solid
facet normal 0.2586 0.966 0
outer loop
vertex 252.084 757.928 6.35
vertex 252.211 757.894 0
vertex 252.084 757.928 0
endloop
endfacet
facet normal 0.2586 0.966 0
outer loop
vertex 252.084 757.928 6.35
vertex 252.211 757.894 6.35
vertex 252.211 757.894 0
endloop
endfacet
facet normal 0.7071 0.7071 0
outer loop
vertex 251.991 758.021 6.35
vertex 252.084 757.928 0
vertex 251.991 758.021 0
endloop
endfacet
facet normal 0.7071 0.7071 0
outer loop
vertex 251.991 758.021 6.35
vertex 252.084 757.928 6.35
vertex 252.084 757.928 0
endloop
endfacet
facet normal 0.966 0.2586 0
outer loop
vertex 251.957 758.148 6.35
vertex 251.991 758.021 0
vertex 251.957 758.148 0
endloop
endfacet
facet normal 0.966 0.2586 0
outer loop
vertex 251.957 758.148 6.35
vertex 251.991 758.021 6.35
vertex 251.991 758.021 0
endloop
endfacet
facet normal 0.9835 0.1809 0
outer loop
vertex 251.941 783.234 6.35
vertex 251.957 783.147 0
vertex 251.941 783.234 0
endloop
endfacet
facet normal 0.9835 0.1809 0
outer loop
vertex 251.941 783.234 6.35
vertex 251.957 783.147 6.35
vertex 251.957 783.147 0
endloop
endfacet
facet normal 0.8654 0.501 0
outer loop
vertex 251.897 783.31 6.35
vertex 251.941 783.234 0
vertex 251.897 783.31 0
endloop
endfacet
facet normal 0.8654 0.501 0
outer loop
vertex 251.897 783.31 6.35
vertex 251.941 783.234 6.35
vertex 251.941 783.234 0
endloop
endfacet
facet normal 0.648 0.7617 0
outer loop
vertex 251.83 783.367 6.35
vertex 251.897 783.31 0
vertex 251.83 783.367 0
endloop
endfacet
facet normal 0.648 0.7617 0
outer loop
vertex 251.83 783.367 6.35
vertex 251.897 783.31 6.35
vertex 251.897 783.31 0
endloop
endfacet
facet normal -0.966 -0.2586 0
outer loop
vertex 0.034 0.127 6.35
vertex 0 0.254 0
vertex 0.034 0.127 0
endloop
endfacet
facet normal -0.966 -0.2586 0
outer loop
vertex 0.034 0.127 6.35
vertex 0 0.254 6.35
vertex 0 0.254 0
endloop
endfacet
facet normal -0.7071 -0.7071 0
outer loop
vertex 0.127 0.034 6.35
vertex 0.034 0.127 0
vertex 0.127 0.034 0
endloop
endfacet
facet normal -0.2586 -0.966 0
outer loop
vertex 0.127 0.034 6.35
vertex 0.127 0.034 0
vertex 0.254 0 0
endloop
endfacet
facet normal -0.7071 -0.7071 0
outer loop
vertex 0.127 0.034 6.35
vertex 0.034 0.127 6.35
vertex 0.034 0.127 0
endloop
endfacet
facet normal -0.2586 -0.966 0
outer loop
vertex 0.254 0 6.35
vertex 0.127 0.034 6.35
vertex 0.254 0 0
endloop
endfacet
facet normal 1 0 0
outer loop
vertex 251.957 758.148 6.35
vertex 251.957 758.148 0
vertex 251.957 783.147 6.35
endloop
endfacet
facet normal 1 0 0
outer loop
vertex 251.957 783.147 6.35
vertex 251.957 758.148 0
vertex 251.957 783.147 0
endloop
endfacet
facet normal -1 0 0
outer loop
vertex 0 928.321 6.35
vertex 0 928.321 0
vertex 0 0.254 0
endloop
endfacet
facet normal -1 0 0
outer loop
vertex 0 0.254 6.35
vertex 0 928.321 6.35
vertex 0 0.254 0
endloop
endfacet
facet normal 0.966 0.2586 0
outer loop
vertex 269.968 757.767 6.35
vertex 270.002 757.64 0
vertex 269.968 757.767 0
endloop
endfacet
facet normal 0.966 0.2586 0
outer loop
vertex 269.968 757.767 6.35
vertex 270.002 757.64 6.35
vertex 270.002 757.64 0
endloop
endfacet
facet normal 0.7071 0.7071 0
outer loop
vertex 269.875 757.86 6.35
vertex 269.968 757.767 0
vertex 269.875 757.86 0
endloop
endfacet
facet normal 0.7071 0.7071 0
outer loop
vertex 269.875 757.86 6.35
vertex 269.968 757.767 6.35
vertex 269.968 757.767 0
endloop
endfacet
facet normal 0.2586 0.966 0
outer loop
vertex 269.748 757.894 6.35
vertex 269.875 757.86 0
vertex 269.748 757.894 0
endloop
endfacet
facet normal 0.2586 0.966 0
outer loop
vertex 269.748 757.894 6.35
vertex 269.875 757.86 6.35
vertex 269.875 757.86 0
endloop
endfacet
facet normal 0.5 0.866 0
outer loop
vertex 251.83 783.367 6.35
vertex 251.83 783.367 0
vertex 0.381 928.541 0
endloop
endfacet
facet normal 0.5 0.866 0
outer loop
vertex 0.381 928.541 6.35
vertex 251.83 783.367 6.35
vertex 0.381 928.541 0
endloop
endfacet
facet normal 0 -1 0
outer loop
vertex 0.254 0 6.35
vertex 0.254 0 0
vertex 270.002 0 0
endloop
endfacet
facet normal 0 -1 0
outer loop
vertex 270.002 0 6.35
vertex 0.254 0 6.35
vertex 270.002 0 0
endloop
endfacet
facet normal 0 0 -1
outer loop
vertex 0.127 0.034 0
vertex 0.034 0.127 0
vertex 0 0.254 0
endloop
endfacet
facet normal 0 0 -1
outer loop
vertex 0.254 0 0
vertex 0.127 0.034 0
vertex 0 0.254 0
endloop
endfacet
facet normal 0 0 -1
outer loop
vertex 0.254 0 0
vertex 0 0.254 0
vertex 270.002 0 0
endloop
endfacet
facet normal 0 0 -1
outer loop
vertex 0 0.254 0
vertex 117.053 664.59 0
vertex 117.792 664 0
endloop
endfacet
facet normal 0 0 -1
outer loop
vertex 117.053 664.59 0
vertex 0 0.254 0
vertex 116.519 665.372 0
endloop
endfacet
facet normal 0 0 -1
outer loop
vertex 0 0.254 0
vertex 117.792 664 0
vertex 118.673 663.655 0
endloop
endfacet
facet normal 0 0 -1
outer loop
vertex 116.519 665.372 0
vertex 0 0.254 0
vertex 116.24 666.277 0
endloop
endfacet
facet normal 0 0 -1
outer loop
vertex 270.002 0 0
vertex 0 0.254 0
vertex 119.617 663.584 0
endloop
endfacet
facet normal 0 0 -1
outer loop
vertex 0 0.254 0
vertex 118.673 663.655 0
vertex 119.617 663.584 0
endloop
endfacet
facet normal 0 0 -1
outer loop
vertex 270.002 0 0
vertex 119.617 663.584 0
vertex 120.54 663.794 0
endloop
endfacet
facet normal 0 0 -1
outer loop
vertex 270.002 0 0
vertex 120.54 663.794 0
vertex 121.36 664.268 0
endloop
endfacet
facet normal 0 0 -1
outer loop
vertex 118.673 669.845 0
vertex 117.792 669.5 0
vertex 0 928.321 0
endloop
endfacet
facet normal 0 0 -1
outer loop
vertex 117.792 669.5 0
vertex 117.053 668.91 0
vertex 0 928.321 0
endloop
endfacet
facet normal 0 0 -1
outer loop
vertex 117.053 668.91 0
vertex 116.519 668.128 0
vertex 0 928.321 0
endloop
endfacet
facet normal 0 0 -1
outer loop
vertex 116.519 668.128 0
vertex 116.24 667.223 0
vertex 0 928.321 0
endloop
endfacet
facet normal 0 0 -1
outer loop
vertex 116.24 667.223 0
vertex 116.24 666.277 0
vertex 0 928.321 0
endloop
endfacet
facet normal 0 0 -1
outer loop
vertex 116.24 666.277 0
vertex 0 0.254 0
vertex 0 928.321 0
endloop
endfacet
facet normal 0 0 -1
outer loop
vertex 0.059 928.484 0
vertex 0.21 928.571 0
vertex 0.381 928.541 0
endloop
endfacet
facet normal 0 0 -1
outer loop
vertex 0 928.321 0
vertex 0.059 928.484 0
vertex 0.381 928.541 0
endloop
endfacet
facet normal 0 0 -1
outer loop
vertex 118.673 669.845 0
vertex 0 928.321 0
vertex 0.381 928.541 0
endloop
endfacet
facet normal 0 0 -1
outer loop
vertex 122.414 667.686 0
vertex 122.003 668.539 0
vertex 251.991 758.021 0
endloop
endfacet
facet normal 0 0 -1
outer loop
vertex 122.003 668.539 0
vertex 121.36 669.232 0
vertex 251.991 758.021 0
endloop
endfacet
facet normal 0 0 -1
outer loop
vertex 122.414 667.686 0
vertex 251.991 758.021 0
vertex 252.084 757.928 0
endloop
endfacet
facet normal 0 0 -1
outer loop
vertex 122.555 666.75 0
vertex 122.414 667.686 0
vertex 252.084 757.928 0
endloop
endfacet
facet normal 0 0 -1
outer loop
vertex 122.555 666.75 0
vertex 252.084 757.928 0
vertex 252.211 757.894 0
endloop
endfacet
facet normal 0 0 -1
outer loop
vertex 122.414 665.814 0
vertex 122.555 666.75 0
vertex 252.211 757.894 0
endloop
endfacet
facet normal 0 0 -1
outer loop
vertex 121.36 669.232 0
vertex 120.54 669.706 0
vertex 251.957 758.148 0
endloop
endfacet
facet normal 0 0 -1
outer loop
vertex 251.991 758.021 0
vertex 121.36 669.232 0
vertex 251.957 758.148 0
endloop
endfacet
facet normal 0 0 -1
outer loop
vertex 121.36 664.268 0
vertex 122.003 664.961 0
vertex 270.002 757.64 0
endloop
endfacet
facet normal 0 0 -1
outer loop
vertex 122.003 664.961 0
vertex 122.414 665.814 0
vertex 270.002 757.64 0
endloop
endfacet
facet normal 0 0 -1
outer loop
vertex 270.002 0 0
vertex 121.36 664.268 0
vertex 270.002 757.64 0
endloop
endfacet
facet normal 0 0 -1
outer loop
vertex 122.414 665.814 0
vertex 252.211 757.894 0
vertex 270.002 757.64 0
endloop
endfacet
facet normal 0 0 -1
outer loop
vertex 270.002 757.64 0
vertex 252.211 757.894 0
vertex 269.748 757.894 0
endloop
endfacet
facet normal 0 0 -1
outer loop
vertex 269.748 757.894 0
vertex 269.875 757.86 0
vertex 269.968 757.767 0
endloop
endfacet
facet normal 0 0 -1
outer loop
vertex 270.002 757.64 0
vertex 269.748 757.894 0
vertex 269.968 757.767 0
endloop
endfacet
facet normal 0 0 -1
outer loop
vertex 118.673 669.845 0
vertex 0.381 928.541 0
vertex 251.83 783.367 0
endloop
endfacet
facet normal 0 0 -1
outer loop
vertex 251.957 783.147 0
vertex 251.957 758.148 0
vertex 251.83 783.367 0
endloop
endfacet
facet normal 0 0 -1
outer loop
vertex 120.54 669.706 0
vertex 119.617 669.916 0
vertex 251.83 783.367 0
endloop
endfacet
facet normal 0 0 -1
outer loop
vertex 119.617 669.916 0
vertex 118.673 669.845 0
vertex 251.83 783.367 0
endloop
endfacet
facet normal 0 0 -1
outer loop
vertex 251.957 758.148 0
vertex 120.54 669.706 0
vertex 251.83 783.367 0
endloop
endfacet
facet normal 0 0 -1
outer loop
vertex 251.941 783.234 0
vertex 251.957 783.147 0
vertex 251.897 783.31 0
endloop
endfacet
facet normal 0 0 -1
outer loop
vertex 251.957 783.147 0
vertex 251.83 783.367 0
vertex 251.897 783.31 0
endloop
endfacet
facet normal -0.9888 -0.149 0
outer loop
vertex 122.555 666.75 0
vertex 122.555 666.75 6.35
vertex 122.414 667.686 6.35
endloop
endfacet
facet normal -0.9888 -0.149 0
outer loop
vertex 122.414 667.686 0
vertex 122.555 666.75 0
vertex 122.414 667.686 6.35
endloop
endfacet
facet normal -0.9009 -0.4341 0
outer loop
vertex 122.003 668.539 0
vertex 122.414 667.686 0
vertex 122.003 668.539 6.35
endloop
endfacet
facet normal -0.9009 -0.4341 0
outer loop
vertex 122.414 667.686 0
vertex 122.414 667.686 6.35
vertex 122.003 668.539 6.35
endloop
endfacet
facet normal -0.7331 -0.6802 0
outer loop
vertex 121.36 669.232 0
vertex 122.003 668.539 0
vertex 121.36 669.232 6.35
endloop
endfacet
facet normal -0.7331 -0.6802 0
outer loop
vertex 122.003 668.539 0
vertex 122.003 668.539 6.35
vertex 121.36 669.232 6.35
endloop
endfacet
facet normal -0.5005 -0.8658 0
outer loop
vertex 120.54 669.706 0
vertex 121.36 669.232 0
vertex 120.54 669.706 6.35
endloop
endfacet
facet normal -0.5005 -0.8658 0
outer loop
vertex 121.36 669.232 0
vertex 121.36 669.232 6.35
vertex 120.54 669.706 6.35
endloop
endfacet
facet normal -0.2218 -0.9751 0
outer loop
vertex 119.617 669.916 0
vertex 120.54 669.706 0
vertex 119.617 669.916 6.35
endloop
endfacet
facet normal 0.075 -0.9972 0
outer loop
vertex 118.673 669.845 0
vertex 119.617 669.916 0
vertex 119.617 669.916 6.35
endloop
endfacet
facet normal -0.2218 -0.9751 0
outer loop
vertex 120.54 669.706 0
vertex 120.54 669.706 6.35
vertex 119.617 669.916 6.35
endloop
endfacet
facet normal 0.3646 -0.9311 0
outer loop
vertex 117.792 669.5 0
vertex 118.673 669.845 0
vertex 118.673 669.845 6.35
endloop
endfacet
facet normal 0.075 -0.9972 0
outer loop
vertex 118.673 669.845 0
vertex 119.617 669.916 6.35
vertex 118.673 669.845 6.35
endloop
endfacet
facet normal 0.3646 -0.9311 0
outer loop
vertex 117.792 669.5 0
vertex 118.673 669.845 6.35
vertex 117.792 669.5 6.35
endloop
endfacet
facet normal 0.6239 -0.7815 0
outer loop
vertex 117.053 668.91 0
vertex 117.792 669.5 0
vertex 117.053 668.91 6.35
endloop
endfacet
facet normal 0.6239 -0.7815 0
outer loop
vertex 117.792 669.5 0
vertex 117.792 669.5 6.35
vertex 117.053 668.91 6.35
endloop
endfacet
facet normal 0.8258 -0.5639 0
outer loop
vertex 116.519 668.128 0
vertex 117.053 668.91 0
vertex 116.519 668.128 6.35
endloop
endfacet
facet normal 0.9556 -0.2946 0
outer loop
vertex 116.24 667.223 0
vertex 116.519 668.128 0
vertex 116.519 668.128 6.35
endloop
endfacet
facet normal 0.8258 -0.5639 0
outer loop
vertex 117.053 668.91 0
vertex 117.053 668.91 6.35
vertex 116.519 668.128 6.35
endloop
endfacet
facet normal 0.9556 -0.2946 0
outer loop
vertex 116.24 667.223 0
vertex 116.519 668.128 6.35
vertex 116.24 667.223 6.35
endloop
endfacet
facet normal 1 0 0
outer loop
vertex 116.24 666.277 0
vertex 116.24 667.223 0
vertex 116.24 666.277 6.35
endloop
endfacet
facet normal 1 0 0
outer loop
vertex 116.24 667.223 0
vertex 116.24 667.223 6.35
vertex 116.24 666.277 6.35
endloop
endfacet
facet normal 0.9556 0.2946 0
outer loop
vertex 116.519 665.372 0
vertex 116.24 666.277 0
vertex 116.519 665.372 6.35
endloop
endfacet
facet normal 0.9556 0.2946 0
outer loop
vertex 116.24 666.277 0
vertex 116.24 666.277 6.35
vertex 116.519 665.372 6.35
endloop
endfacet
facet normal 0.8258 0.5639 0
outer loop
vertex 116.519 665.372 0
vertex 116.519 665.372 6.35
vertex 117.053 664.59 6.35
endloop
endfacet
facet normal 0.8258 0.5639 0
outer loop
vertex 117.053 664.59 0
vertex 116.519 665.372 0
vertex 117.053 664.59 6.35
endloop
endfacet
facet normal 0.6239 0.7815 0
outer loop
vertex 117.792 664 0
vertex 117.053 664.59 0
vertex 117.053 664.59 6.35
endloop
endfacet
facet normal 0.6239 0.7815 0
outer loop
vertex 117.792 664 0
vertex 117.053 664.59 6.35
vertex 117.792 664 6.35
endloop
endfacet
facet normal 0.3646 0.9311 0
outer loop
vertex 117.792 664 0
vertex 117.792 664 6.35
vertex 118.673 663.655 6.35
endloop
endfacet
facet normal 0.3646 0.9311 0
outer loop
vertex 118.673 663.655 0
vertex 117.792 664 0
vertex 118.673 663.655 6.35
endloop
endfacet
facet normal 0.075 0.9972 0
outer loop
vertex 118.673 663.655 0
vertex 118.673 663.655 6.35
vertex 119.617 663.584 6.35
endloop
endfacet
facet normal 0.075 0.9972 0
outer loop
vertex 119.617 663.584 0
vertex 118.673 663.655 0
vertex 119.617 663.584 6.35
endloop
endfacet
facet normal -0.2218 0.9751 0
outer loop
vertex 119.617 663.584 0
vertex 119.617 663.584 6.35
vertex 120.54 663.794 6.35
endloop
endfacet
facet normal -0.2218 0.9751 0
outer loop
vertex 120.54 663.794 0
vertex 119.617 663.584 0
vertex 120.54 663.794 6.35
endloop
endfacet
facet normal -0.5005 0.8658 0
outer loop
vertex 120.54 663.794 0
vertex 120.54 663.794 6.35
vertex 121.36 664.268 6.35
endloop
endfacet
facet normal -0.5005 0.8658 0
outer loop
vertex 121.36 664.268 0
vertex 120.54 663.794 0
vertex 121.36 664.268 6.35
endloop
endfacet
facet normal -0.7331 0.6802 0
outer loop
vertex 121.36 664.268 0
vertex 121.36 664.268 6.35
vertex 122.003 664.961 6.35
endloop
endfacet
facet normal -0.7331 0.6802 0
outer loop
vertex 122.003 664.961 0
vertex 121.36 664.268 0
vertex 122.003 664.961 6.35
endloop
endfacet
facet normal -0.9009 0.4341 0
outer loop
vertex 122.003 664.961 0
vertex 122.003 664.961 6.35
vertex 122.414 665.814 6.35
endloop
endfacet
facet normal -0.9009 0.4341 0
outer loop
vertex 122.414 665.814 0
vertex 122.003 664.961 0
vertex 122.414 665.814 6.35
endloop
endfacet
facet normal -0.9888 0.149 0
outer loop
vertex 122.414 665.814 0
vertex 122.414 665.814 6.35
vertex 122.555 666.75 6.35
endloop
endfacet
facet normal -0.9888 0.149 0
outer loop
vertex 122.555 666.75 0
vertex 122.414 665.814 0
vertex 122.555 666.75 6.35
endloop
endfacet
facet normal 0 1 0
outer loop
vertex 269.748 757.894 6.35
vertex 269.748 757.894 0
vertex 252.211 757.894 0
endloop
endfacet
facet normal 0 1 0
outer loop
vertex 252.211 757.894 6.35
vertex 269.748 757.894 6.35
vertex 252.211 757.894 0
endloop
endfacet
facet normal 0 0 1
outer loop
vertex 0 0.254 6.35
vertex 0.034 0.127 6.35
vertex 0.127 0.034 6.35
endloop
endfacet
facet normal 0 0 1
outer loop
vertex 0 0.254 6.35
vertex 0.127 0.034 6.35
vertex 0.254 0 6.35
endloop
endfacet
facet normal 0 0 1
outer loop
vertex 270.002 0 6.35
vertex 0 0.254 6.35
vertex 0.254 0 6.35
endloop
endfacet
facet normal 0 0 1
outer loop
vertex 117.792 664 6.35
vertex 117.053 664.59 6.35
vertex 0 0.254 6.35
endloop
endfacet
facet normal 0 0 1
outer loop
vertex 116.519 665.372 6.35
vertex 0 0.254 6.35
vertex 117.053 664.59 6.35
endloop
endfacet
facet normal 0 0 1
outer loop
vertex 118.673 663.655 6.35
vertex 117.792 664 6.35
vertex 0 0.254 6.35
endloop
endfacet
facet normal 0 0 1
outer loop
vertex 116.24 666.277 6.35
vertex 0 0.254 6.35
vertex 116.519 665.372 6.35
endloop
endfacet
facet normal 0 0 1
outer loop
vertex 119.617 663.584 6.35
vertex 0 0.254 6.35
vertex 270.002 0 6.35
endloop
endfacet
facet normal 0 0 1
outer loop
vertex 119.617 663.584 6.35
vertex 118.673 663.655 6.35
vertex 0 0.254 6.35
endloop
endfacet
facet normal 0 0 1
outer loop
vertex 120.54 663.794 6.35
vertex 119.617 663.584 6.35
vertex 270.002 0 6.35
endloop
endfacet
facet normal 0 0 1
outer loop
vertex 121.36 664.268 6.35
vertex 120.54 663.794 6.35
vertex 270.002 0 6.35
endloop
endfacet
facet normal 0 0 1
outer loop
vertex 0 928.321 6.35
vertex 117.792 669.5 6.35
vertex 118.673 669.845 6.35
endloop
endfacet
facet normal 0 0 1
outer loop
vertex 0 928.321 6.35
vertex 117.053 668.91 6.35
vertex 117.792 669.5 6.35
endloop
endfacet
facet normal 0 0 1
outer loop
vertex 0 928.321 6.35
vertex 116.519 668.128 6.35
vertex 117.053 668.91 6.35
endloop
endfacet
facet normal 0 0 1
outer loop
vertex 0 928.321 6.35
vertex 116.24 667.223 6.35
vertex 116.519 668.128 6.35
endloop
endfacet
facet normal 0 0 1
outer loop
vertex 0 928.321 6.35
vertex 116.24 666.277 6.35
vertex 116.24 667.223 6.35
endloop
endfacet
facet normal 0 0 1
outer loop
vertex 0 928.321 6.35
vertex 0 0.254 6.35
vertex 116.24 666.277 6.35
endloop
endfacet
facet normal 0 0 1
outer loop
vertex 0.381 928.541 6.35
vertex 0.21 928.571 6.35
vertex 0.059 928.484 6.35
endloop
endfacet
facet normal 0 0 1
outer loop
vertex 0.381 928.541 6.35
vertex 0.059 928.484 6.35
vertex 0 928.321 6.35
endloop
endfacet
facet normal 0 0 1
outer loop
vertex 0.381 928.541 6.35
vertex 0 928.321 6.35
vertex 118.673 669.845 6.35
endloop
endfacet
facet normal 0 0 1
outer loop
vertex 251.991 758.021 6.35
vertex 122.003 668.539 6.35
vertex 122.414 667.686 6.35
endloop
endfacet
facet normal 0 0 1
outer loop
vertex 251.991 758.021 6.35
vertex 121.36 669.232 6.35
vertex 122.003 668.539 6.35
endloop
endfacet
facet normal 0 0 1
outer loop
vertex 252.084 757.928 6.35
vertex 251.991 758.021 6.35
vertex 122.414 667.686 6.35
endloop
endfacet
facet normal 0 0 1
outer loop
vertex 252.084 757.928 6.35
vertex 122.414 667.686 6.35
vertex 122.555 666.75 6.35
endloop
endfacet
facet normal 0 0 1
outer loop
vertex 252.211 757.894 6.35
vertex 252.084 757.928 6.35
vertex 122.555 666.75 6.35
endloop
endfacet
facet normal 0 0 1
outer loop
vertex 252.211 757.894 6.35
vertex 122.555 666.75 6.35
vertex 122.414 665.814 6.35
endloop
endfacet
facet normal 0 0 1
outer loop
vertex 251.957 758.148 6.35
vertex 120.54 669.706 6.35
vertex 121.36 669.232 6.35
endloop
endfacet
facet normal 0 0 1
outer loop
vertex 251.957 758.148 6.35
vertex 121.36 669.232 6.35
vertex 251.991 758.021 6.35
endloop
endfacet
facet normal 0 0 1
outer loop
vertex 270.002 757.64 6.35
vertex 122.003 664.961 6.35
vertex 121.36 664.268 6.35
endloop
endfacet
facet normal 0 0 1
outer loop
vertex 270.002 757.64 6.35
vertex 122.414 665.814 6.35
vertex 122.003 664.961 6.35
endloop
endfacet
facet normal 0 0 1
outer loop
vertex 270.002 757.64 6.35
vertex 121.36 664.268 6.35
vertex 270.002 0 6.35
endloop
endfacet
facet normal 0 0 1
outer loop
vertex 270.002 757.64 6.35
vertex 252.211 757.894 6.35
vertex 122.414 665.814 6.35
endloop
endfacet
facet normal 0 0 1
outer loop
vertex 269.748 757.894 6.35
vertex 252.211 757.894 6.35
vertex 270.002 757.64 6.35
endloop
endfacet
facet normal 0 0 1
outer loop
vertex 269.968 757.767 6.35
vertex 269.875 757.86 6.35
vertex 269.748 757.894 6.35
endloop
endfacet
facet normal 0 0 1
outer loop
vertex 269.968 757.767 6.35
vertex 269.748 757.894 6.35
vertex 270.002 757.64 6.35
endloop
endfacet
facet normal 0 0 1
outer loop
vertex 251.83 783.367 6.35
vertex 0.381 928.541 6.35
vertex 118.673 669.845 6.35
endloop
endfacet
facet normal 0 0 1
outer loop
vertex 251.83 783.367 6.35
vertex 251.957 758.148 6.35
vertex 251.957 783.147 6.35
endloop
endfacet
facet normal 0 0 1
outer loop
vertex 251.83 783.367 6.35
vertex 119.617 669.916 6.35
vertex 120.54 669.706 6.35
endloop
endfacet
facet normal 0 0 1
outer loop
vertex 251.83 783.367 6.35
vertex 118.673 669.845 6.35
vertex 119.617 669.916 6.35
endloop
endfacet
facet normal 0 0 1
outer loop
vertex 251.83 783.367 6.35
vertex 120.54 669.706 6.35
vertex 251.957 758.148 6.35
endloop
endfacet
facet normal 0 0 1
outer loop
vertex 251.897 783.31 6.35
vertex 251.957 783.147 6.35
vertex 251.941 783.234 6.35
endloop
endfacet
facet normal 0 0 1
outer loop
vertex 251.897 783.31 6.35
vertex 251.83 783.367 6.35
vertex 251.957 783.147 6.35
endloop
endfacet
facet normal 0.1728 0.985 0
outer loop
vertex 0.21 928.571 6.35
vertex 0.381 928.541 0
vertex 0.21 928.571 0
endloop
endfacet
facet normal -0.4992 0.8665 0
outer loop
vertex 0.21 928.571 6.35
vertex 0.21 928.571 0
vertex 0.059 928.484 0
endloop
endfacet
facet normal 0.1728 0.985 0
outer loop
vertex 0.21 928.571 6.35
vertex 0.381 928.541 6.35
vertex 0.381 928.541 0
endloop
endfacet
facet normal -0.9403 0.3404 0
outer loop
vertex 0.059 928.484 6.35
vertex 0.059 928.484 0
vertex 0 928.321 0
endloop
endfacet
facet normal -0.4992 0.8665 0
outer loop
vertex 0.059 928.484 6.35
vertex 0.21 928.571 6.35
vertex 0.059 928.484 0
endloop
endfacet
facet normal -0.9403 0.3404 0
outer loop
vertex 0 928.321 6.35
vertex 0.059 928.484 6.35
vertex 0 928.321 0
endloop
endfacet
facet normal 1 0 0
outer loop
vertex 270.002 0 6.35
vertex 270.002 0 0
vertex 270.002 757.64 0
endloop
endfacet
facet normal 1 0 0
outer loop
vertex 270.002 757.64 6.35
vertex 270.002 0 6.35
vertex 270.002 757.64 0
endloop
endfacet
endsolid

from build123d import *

# Parameters (mm, degrees)
BOSS_EXTRUDE1_DEPTH = 6.35
FILLET2_R           = 0.254
SKETCH2_R           = 3.175
CUT_EXTRUDE1_DEPTH  = 968.053696438


with BuildPart() as part:
    # Sketch1 → Boss-Extrude1 (new body)
    with BuildSketch(Plane.XY):
        Polygon((270.002, 0), (270.002, 757.893717478), (251.956545956, 757.893717478), (251.956545956, 783.293717478), (0, 928.76089711), (0, 0), align=None)
    extrude(amount=BOSS_EXTRUDE1_DEPTH)

    # Fillet2
    fillet2_edges = [part.edges().sort_by_distance(p)[0] for p in [
        (0, 0, 3.175),
        (0, 928.76089711, 3.175),
        (251.956545956, 783.293717478, 3.175),
        (251.956545956, 757.893717478, 3.175),
        (270.002, 757.893717478, 3.175),
    ]]
    fillet(fillet2_edges, radius=FILLET2_R)

    # Sketch2 → Cut-Extrude1 (cut, through all)
    with BuildSketch(Plane.XY.offset(6.35)):
        with Locations((119.38, 666.75)):
            Circle(SKETCH2_R)
    extrude(amount=-CUT_EXTRUDE1_DEPTH, mode=Mode.SUBTRACT)


solid = part.part
